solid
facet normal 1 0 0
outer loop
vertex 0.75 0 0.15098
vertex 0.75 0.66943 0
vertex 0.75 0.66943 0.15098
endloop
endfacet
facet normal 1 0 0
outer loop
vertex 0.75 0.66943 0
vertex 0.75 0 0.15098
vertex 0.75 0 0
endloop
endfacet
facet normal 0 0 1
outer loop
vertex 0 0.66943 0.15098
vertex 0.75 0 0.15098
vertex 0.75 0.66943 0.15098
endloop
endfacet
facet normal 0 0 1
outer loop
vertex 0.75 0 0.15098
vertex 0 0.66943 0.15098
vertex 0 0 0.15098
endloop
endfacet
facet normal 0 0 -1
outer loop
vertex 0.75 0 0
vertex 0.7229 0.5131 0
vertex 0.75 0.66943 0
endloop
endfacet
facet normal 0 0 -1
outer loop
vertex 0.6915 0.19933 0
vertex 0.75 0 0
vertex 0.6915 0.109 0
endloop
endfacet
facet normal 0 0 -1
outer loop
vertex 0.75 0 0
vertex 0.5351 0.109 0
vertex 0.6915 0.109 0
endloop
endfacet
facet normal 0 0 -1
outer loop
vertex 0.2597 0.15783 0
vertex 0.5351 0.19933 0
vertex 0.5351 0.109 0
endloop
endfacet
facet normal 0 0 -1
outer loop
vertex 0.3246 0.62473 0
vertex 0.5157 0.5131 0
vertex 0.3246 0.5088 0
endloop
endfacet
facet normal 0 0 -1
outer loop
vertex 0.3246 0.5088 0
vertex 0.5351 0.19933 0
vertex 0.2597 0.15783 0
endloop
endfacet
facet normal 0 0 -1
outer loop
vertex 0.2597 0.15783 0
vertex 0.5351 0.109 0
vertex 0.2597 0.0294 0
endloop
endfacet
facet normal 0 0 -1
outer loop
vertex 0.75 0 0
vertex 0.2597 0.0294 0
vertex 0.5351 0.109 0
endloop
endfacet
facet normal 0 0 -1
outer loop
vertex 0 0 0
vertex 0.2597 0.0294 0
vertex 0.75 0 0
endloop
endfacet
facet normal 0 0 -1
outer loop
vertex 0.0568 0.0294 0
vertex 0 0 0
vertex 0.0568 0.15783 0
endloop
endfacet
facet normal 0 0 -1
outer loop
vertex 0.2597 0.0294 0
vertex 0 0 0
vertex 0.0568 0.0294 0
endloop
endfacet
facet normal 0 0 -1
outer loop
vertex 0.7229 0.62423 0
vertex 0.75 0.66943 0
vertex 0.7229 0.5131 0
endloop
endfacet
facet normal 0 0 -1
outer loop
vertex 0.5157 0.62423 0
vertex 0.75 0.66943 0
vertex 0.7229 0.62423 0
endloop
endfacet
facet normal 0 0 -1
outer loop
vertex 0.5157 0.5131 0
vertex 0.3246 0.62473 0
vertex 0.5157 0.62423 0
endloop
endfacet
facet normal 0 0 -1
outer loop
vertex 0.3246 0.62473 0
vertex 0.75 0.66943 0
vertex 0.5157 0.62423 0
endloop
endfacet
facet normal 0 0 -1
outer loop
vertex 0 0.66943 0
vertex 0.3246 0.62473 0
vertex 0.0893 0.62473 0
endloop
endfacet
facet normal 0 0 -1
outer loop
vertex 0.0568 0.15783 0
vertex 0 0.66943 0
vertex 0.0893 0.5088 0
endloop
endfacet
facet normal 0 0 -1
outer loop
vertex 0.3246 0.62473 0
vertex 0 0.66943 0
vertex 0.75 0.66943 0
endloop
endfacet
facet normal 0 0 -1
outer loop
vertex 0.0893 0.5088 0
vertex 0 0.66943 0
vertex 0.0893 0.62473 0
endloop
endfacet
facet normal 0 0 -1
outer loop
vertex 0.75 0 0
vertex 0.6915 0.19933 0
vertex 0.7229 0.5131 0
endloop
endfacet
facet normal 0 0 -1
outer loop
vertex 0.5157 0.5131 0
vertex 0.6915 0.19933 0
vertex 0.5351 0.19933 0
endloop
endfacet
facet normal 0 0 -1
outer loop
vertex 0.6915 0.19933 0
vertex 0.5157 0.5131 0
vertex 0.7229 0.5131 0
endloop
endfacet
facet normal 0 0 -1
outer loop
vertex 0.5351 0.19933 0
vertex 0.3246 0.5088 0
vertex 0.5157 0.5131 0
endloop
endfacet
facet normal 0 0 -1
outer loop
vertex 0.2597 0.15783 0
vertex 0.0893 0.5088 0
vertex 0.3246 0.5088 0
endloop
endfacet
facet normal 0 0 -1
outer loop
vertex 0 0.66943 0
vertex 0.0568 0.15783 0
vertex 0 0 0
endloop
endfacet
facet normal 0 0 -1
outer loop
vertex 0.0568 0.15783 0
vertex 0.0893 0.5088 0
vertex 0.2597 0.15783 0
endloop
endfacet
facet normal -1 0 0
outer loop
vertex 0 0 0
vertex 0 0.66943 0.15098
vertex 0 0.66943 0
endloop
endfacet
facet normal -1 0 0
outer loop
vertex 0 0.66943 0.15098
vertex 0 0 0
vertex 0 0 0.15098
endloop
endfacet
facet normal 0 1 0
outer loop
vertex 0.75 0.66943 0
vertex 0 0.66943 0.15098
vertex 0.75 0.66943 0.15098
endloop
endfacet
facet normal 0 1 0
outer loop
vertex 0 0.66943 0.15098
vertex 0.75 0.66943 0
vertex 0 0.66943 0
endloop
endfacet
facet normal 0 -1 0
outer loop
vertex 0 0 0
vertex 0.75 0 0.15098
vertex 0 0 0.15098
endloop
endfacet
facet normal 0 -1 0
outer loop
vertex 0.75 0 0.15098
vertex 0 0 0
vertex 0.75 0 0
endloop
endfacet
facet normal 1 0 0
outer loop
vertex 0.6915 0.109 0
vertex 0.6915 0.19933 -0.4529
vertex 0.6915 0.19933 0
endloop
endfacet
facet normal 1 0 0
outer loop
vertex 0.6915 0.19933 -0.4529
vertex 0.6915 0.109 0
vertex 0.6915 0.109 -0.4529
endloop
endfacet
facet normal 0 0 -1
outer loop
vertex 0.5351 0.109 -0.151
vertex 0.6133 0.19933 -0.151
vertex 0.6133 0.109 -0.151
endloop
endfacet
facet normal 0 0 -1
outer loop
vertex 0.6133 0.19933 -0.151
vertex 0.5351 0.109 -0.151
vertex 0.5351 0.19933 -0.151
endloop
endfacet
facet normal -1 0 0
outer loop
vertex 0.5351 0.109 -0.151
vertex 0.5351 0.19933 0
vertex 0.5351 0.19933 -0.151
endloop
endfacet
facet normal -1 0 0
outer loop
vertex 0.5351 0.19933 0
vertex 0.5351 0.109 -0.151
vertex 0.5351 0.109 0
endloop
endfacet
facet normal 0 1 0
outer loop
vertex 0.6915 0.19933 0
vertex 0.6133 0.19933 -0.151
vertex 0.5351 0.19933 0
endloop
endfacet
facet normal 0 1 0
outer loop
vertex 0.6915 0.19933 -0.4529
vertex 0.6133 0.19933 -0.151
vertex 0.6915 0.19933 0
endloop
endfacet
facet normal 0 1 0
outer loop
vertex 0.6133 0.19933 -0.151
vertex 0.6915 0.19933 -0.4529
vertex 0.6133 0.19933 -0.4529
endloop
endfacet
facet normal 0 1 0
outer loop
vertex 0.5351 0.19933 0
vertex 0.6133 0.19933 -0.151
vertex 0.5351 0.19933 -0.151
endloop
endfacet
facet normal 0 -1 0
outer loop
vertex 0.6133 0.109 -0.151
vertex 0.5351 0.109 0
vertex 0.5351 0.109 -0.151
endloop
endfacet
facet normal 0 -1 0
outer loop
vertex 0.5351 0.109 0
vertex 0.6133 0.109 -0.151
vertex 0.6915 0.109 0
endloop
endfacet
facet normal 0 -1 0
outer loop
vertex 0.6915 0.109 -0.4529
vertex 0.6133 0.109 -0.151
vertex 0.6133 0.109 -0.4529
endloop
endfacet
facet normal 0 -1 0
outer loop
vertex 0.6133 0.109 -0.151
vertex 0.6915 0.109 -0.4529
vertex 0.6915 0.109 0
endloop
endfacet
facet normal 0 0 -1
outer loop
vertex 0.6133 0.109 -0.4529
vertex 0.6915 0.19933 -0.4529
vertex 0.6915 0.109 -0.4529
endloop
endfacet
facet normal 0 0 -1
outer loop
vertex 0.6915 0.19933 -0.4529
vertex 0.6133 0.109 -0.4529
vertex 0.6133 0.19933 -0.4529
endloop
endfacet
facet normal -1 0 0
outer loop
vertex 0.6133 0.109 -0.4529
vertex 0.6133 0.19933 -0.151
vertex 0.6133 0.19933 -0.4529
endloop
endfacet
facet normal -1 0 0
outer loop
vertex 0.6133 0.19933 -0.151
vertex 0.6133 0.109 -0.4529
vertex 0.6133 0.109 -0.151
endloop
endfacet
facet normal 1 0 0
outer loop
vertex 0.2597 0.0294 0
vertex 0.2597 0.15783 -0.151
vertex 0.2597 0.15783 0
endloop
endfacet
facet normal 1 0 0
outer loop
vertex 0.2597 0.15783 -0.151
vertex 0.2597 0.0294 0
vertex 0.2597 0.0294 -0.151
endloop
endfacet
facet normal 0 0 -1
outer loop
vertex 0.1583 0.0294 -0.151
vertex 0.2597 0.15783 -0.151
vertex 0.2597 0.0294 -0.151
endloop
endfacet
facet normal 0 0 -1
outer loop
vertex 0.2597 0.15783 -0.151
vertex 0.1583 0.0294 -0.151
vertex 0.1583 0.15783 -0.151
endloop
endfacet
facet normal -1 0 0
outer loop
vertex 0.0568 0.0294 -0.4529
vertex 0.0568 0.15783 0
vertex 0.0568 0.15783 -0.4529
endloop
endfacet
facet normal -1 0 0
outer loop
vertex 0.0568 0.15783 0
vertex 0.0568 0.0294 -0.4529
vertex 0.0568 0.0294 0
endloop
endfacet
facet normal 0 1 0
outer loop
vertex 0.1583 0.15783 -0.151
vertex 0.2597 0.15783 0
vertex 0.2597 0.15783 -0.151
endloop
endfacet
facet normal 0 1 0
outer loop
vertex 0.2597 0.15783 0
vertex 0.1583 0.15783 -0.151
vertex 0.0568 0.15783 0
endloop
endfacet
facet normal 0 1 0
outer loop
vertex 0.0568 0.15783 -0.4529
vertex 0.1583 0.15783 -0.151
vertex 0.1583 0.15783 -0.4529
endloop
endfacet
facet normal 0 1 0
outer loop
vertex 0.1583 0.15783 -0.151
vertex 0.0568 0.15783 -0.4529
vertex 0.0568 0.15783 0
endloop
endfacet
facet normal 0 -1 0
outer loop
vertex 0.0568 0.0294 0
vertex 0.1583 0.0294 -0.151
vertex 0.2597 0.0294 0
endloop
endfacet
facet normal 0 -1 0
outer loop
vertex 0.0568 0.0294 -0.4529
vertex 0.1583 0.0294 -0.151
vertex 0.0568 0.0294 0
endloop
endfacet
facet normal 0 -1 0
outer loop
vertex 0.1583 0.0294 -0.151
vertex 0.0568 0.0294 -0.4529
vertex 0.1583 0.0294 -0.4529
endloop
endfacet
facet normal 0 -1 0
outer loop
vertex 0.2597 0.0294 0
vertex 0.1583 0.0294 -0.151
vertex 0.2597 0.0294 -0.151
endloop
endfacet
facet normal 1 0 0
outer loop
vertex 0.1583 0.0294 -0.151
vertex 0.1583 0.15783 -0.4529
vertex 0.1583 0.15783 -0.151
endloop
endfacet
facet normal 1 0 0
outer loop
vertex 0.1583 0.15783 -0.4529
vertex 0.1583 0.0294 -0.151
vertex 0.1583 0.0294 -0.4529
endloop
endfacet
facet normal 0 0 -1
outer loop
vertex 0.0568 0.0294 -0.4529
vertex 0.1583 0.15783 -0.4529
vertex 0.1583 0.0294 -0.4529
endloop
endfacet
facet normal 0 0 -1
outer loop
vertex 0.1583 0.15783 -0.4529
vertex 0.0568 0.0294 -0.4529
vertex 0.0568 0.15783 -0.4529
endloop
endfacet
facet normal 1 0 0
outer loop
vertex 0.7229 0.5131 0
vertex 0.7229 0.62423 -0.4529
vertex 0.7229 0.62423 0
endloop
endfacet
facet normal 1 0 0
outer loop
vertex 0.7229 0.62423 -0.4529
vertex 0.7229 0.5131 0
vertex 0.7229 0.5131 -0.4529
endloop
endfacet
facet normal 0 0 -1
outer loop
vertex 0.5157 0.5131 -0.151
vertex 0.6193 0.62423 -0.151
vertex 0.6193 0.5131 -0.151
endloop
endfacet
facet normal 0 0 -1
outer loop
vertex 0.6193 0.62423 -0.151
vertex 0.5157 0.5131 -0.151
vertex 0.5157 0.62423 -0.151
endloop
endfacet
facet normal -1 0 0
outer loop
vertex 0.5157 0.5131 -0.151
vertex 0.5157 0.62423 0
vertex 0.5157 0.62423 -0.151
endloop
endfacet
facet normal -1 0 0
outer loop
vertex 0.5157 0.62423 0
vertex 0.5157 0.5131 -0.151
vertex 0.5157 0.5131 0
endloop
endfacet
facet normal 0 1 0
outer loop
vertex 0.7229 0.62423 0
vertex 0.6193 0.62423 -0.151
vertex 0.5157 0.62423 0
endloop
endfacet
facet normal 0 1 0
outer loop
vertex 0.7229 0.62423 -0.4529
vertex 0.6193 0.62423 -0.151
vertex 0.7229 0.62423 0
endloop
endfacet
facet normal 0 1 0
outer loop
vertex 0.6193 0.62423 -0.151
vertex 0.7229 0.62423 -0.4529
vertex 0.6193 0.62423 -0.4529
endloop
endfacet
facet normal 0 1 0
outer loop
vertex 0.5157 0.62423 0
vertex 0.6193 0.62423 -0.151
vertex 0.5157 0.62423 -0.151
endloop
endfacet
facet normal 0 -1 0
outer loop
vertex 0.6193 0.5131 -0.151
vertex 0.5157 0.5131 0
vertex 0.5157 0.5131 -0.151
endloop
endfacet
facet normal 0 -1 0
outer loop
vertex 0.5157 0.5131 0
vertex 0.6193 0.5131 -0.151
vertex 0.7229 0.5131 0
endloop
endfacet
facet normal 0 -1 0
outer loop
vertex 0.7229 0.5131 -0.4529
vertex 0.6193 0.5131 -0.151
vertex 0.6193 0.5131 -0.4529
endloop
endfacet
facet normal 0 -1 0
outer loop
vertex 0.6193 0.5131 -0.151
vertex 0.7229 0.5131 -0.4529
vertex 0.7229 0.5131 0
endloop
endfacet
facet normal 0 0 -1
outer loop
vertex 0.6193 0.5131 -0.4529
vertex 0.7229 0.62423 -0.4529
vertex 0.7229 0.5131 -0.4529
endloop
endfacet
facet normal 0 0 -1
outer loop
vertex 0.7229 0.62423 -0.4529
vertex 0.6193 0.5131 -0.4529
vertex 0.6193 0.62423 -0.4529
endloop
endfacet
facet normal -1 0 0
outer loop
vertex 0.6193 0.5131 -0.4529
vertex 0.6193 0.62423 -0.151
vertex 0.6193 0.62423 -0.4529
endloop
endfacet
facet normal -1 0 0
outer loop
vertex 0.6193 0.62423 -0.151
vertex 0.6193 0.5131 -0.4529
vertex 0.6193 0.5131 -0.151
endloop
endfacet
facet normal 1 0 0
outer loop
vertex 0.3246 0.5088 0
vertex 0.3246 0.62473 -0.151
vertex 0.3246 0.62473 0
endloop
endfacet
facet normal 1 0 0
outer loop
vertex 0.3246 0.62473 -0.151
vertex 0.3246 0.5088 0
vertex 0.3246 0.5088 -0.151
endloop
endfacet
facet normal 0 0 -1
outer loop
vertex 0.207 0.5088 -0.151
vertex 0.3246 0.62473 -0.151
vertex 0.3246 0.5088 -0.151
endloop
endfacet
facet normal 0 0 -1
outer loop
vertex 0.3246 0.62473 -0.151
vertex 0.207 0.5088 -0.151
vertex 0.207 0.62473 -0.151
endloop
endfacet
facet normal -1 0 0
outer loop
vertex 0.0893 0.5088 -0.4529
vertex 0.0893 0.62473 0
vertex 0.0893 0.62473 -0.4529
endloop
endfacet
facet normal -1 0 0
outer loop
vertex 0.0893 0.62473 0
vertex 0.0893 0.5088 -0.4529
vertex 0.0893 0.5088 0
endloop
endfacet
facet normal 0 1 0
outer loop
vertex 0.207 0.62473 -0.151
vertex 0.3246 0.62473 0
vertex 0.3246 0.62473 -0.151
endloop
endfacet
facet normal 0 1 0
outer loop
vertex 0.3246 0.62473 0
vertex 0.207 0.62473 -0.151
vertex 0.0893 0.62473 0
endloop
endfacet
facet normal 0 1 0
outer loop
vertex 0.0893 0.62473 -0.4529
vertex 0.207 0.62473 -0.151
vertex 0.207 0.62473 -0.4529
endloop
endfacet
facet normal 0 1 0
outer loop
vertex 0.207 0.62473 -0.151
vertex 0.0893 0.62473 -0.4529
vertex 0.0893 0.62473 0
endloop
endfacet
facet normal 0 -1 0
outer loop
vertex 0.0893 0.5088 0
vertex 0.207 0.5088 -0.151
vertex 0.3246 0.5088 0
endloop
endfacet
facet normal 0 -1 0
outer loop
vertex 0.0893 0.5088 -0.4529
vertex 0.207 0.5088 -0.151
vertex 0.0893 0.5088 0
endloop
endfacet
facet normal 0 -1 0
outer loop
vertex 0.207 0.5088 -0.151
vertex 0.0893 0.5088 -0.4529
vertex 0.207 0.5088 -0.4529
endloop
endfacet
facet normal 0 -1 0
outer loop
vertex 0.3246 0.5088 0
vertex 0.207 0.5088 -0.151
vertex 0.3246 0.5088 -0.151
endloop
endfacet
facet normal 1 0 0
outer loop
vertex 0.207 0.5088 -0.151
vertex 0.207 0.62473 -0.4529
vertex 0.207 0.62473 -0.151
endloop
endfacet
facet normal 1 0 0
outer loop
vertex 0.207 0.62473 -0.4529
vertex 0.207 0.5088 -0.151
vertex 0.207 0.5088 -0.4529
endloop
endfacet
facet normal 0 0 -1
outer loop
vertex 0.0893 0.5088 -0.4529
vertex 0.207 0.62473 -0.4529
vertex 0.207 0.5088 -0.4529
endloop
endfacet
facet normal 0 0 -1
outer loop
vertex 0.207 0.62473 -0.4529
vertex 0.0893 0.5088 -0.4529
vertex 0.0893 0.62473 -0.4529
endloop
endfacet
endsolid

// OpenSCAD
// === Parameters ===

// Base dimensions
base_length = 0.75;         // X
base_width  = 0.669426;     // Y
base_height = 0.150979;     // Z (upward from z=0)

// Shallow pad depth (below base underside at z=0)
shallow_depth = 0.151;

// Deep continuation Z range (below base underside)
deep_start = 0.1509;        // top of deep section below base underside
deep_end   = 0.4529;        // bottom of deep section below base underside
deep_depth = deep_end - deep_start; // 0.302

// Pad 1 shallow: offsets from base edges
p1_left  = 0.5351;  p1_right = 0.0585;
p1_front = 0.109;   p1_back  = 0.4701;
p1_sx = base_length - p1_left - p1_right;  // 0.156427
p1_sy = base_width  - p1_front - p1_back;  // 0.090313

// Pad 1 deep continuation (shares right, front, back)
p1d_left = 0.6133;  p1d_right = 0.0585;
p1d_sx = base_length - p1d_left - p1d_right; // 0.078214
p1d_sy = p1_sy;

// Pad 2 shallow
p2_left  = 0.0568;  p2_right = 0.4903;
p2_front = 0.0294;  p2_back  = 0.5116;
p2_sx = base_length - p2_left - p2_right;  // 0.202932
p2_sy = base_width  - p2_front - p2_back;  // 0.128382

// Pad 2 deep continuation (shares left, front, back)
p2d_left = 0.0568;  p2d_right = 0.5917;
p2d_sx = base_length - p2d_left - p2d_right; // 0.101466
p2d_sy = p2_sy;

// Pad 3 shallow
p3_left  = 0.5157;  p3_right = 0.0271;
p3_front = 0.5131;  p3_back  = 0.0452;
p3_sx = base_length - p3_left - p3_right;  // 0.207237
p3_sy = base_width  - p3_front - p3_back;  // 0.111076

// Pad 3 deep continuation (shares right, front, back)
p3d_left = 0.6193;  p3d_right = 0.0271;
p3d_sx = base_length - p3d_left - p3d_right; // 0.103619
p3d_sy = p3_sy;

// Pad 4 shallow
p4_left  = 0.0893;  p4_right = 0.4254;
p4_front = 0.5088;  p4_back  = 0.0447;
p4_sx = base_length - p4_left - p4_right;  // 0.235324
p4_sy = base_width  - p4_front - p4_back;  // 0.115862

// Pad 4 deep continuation (shares left, front, back)
p4d_left = 0.0893;  p4d_right = 0.543;
p4d_sx = base_length - p4d_left - p4d_right; // 0.117662
p4d_sy = p4_sy;

// === Assembly ===
// Base bottom at z=0, pads extend downward into -Z

union() {
    // --- Rectangular base ---
    cube([base_length, base_width, base_height]);

    // --- Pad 1: shallow section ---
    translate([p1_left, p1_front, -shallow_depth])
        cube([p1_sx, p1_sy, shallow_depth]);

    // --- Pad 1: deep continuation (aligned to right, front, back) ---
    translate([p1d_left, p1_front, -deep_end])
        cube([p1d_sx, p1d_sy, deep_depth]);

    // --- Pad 2: shallow section ---
    translate([p2_left, p2_front, -shallow_depth])
        cube([p2_sx, p2_sy, shallow_depth]);

    // --- Pad 2: deep continuation (aligned to left, front, back) ---
    translate([p2d_left, p2_front, -deep_end])
        cube([p2d_sx, p2d_sy, deep_depth]);

    // --- Pad 3: shallow section ---
    translate([p3_left, p3_front, -shallow_depth])
        cube([p3_sx, p3_sy, shallow_depth]);

    // --- Pad 3: deep continuation (aligned to right, front, back) ---
    translate([p3d_left, p3_front, -deep_end])
        cube([p3d_sx, p3d_sy, deep_depth]);

    // --- Pad 4: shallow section ---
    translate([p4_left, p4_front, -shallow_depth])
        cube([p4_sx, p4_sy, shallow_depth]);

    // --- Pad 4: deep continuation (aligned to left, front, back) ---
    translate([p4d_left, p4_front, -deep_end])
        cube([p4d_sx, p4d_sy, deep_depth]);
}
